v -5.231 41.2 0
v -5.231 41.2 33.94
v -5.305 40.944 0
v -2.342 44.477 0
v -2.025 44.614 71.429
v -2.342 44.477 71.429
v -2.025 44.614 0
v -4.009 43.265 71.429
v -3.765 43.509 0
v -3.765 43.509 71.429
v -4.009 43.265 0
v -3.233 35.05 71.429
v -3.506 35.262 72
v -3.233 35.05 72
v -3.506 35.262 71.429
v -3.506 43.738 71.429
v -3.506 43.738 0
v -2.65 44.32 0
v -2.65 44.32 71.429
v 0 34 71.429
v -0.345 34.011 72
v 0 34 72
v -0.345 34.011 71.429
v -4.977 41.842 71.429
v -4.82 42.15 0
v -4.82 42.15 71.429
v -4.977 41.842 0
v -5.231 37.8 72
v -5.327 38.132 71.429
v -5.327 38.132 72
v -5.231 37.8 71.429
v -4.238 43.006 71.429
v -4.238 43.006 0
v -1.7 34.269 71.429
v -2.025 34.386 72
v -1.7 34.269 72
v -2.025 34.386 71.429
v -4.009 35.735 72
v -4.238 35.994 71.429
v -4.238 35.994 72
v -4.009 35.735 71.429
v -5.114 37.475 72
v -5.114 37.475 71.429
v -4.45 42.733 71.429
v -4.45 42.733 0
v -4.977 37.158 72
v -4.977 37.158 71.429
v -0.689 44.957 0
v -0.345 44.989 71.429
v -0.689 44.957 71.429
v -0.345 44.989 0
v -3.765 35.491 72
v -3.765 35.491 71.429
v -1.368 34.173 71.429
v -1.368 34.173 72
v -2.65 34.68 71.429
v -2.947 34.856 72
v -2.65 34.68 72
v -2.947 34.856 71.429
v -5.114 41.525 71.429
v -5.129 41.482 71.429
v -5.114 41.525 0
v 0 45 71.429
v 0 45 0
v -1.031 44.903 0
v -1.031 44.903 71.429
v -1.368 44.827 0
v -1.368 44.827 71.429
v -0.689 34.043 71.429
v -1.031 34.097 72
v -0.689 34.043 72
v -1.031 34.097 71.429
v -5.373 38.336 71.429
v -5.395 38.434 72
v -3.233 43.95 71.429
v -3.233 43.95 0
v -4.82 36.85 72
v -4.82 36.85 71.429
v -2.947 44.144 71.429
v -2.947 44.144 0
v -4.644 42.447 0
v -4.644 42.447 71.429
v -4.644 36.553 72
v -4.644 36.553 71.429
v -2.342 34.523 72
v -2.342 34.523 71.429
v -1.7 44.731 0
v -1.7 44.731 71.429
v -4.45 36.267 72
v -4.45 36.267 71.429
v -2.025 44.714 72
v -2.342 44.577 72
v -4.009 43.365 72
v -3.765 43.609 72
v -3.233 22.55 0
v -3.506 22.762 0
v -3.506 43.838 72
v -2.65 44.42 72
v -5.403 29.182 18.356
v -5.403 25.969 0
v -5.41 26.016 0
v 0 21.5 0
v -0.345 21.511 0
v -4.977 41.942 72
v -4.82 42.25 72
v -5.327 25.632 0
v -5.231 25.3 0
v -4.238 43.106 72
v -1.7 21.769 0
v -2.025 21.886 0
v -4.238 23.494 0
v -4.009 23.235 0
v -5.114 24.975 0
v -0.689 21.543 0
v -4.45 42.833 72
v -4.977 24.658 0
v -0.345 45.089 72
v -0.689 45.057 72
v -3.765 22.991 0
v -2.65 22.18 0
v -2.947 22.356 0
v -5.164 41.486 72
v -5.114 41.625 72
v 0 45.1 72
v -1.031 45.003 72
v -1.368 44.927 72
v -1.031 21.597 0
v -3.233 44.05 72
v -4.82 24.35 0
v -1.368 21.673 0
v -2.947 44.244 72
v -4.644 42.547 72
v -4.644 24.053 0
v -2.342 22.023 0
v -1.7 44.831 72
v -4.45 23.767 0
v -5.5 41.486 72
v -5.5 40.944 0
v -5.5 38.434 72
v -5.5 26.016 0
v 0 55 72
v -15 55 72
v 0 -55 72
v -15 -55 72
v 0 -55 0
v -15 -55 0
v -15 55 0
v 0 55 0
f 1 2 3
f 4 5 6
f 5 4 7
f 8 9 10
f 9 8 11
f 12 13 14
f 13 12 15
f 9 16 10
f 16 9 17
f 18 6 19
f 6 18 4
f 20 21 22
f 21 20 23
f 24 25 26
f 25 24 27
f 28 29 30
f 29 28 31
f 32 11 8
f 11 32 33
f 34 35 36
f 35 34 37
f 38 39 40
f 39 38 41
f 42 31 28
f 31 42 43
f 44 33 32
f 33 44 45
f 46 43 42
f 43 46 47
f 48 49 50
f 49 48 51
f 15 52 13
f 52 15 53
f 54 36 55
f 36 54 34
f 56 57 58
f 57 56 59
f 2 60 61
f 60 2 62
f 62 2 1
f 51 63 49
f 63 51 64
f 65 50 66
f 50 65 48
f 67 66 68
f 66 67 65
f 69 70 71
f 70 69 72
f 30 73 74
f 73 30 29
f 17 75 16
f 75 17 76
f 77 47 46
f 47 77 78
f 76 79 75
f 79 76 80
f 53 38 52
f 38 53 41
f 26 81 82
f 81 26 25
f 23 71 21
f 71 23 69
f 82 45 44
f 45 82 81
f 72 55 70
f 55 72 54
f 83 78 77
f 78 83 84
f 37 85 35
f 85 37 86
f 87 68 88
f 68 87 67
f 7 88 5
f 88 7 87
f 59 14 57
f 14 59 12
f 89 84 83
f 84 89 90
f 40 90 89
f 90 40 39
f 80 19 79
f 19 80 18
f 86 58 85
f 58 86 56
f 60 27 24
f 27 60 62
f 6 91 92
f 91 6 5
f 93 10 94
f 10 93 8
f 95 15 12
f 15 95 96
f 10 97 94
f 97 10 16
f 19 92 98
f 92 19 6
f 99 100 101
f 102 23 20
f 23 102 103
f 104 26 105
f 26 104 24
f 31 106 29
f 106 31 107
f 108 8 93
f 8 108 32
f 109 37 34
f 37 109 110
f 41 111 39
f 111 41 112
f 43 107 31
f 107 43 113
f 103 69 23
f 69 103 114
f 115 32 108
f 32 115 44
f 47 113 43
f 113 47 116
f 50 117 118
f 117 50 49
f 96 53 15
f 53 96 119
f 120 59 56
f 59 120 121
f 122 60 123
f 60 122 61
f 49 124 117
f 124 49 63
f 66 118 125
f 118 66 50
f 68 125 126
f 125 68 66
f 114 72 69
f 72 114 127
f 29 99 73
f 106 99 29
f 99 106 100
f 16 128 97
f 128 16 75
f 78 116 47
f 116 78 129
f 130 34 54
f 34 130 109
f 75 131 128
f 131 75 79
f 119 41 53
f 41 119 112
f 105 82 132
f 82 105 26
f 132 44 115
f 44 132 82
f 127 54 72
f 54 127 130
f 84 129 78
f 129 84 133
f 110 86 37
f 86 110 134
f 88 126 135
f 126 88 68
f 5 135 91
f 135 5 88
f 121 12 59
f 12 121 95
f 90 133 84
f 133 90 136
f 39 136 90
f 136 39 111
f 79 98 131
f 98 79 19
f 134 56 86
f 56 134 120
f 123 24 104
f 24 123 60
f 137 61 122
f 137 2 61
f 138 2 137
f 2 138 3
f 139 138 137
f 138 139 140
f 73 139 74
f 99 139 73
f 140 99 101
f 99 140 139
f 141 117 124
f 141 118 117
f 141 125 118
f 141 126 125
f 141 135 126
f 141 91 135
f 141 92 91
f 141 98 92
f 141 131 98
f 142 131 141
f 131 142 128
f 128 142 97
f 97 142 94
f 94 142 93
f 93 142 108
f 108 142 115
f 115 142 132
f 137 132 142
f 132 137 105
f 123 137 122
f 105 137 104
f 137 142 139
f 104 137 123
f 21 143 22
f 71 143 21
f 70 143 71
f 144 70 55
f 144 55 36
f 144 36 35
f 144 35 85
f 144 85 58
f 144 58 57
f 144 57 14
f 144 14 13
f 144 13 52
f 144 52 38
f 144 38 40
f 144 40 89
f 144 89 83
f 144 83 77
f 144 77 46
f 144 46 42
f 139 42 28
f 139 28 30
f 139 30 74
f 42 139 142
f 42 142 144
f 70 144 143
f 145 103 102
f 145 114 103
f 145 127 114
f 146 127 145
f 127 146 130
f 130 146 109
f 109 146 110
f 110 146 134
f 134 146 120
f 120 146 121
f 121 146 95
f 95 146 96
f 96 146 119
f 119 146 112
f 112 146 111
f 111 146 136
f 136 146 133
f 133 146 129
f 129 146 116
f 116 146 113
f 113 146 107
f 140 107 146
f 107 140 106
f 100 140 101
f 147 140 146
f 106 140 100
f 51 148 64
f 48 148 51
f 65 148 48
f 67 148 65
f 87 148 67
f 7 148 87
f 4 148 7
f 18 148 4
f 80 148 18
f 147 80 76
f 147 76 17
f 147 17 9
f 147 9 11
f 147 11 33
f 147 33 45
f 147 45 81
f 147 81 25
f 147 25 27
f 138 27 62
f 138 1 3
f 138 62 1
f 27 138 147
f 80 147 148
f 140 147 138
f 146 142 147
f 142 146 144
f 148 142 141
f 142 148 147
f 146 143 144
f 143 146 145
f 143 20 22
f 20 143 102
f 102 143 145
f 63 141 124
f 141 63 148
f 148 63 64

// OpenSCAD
HEIGHT = 80+30;

module separator_block() {
    cube([30,HEIGHT,5], center = true);
}

module hole() {
    DIAMETER = 11;
    translate([0,HEIGHT/2 - DIAMETER/2 - 10,40])
    cylinder(d = DIAMETER, h = 100, center = true, $fn = 100);
    
    multmatrix([[1,0,0,0],
                [0,1,0.175,1.5],
                [0,0,1,0]])
    translate([0,HEIGHT/2 + DIAMETER/2 - (HEIGHT - 30 - 45),40])
    cylinder(d = DIAMETER, h = 100, center = true, $fn = 100);
    
    //translate([0,HEIGHT/2 + 9/2 - (HEIGHT - 30 - 45),40])
    //cylinder(d = 9, h = 100, center = true, $fn = 100);
    
    multmatrix([[1,0,0,0],
                [0,1,0.09,31.5],
                [0,0,1,-22]])
    translate([0,0,25])
    scale([1,1,7])
    rotate([0,-90,0])
    cylinder(d = 25, h = DIAMETER, center = true, $fn = 3);
}


*for (i = [0:7]) {
    difference() {
        translate([0,0,i*10]) separator_block();
        translate([0,0,0]) hole();
    }
}

LENGTH = 72;

difference() {
    translate([0,0,LENGTH/2])
    cube([30,HEIGHT,LENGTH], center = true);
    
    hole();
    
    translate([100,0,0])
    cube([200,200,200], center = true);
}
